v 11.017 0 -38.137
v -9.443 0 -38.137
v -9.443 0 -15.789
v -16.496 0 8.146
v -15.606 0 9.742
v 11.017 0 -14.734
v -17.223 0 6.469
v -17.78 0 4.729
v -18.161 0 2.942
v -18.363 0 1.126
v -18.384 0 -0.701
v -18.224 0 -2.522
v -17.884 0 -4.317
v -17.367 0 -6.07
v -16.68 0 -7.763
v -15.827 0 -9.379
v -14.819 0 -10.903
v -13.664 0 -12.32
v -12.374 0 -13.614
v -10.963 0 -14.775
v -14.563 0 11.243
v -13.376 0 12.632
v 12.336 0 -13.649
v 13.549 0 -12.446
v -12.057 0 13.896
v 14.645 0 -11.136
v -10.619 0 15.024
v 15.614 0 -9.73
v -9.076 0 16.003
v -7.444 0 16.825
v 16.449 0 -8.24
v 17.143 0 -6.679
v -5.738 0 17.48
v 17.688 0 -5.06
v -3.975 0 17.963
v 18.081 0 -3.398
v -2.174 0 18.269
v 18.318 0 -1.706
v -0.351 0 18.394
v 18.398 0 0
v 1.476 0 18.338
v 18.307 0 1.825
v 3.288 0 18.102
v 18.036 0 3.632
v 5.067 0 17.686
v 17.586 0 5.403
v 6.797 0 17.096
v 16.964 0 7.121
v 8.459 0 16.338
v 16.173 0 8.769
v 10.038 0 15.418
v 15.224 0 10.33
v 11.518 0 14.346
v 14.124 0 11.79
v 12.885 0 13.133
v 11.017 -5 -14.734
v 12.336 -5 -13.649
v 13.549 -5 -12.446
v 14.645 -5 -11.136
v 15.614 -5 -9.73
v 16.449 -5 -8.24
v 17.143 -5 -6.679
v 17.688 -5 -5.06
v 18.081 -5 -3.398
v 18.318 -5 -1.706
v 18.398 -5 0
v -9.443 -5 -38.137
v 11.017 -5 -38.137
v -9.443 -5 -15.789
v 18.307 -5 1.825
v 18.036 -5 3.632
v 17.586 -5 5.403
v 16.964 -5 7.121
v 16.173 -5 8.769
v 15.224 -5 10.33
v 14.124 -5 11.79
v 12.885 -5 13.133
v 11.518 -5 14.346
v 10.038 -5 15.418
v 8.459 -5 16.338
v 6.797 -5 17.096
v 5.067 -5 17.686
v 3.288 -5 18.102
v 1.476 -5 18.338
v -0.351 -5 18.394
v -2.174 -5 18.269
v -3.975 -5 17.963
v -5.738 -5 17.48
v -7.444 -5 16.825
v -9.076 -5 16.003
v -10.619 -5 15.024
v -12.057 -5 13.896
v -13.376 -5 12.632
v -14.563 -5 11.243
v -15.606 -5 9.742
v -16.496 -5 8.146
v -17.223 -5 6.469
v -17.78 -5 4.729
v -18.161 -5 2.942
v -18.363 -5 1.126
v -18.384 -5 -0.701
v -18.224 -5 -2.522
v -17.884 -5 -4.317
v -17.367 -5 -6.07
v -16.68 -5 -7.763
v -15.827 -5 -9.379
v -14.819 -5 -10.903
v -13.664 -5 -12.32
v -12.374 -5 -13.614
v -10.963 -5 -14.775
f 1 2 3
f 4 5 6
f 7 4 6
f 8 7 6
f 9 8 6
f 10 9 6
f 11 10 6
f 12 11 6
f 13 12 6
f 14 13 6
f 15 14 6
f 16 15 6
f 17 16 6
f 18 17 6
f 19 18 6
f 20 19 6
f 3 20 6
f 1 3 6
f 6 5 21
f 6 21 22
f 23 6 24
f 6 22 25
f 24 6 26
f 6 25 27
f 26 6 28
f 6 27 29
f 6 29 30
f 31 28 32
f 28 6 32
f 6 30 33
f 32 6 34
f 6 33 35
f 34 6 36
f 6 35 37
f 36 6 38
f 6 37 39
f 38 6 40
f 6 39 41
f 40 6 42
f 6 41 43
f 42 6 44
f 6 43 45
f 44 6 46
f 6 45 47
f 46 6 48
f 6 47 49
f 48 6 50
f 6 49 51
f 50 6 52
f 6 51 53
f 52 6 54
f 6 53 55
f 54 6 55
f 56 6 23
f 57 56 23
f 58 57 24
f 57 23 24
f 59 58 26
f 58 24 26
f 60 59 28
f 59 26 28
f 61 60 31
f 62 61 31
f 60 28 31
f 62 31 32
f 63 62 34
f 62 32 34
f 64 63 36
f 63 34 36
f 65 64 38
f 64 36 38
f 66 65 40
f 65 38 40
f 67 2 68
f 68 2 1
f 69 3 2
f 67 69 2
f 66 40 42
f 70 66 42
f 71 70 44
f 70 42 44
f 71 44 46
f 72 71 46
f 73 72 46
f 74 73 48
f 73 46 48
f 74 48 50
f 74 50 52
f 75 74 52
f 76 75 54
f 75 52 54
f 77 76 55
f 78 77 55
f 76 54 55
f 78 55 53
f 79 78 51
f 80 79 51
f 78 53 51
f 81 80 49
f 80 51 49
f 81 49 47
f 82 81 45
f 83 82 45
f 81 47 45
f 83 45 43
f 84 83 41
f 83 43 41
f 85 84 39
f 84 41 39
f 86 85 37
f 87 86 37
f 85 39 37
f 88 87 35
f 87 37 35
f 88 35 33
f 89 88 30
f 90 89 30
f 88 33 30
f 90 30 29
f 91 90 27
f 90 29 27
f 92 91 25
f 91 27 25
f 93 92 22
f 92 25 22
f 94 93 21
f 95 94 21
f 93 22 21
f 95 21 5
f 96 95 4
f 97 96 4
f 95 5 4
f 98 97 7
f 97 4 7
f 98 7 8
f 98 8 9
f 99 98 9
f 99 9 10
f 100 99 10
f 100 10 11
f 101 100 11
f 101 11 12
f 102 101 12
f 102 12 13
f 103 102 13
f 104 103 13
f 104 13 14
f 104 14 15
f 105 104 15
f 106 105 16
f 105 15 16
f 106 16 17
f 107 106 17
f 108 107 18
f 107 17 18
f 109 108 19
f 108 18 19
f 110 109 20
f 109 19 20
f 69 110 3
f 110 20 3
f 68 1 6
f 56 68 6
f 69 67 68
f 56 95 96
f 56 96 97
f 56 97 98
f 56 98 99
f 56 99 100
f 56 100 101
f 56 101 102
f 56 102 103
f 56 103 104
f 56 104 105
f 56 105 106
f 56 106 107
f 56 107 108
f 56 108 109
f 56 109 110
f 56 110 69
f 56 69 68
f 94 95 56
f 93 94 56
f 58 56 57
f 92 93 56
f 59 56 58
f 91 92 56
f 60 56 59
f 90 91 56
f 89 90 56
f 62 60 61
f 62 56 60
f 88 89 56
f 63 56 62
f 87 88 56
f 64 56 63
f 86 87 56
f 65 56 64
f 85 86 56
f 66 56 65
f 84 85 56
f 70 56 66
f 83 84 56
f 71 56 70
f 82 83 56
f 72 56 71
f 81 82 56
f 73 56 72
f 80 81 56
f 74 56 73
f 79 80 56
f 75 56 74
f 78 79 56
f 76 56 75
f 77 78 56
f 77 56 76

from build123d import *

# Parameters (mm, degrees)
F1_DEPTH = 5


with BuildPart() as f1:
    # F0 (on Front) → F1 (new body)
    with BuildSketch(Plane.XZ):
        with BuildLine():
            ThreePointArc((11.016843, -14.734487), (0.947342, -18.373309), (-9.443007, -15.789413))
            Line((-9.443007, -15.789413), (-9.443007, -38.137238))
            Line((-9.443007, -38.137238), (11.016843, -38.137238))
            Line((11.016843, -38.137238), (11.016843, -14.734487))
        make_face()
        with BuildLine():
            Line((-9.443007, 0), (-9.443007, -15.789413))
            ThreePointArc((-9.443007, -15.789413), (0.947342, -18.373309), (11.016843, -14.734487))
            Line((11.016843, -14.734487), (11.016843, 0))
            Line((11.016843, 0), (-9.443007, 0))
        make_face()
        with BuildLine():
            ThreePointArc((11.016843, -14.734487), (16.449327, -8.239879), (18.397716, 0))
            ThreePointArc((18.397716, 0), (-9.075962, 16.003214), (-9.443007, -15.789413))
            Line((-9.443007, -15.789413), (-9.443007, 0))
            Line((-9.443007, 0), (11.016843, 0))
            Line((11.016843, 0), (11.016843, -14.734487))
        make_face()
    extrude(amount=F1_DEPTH)


solid = f1.part
